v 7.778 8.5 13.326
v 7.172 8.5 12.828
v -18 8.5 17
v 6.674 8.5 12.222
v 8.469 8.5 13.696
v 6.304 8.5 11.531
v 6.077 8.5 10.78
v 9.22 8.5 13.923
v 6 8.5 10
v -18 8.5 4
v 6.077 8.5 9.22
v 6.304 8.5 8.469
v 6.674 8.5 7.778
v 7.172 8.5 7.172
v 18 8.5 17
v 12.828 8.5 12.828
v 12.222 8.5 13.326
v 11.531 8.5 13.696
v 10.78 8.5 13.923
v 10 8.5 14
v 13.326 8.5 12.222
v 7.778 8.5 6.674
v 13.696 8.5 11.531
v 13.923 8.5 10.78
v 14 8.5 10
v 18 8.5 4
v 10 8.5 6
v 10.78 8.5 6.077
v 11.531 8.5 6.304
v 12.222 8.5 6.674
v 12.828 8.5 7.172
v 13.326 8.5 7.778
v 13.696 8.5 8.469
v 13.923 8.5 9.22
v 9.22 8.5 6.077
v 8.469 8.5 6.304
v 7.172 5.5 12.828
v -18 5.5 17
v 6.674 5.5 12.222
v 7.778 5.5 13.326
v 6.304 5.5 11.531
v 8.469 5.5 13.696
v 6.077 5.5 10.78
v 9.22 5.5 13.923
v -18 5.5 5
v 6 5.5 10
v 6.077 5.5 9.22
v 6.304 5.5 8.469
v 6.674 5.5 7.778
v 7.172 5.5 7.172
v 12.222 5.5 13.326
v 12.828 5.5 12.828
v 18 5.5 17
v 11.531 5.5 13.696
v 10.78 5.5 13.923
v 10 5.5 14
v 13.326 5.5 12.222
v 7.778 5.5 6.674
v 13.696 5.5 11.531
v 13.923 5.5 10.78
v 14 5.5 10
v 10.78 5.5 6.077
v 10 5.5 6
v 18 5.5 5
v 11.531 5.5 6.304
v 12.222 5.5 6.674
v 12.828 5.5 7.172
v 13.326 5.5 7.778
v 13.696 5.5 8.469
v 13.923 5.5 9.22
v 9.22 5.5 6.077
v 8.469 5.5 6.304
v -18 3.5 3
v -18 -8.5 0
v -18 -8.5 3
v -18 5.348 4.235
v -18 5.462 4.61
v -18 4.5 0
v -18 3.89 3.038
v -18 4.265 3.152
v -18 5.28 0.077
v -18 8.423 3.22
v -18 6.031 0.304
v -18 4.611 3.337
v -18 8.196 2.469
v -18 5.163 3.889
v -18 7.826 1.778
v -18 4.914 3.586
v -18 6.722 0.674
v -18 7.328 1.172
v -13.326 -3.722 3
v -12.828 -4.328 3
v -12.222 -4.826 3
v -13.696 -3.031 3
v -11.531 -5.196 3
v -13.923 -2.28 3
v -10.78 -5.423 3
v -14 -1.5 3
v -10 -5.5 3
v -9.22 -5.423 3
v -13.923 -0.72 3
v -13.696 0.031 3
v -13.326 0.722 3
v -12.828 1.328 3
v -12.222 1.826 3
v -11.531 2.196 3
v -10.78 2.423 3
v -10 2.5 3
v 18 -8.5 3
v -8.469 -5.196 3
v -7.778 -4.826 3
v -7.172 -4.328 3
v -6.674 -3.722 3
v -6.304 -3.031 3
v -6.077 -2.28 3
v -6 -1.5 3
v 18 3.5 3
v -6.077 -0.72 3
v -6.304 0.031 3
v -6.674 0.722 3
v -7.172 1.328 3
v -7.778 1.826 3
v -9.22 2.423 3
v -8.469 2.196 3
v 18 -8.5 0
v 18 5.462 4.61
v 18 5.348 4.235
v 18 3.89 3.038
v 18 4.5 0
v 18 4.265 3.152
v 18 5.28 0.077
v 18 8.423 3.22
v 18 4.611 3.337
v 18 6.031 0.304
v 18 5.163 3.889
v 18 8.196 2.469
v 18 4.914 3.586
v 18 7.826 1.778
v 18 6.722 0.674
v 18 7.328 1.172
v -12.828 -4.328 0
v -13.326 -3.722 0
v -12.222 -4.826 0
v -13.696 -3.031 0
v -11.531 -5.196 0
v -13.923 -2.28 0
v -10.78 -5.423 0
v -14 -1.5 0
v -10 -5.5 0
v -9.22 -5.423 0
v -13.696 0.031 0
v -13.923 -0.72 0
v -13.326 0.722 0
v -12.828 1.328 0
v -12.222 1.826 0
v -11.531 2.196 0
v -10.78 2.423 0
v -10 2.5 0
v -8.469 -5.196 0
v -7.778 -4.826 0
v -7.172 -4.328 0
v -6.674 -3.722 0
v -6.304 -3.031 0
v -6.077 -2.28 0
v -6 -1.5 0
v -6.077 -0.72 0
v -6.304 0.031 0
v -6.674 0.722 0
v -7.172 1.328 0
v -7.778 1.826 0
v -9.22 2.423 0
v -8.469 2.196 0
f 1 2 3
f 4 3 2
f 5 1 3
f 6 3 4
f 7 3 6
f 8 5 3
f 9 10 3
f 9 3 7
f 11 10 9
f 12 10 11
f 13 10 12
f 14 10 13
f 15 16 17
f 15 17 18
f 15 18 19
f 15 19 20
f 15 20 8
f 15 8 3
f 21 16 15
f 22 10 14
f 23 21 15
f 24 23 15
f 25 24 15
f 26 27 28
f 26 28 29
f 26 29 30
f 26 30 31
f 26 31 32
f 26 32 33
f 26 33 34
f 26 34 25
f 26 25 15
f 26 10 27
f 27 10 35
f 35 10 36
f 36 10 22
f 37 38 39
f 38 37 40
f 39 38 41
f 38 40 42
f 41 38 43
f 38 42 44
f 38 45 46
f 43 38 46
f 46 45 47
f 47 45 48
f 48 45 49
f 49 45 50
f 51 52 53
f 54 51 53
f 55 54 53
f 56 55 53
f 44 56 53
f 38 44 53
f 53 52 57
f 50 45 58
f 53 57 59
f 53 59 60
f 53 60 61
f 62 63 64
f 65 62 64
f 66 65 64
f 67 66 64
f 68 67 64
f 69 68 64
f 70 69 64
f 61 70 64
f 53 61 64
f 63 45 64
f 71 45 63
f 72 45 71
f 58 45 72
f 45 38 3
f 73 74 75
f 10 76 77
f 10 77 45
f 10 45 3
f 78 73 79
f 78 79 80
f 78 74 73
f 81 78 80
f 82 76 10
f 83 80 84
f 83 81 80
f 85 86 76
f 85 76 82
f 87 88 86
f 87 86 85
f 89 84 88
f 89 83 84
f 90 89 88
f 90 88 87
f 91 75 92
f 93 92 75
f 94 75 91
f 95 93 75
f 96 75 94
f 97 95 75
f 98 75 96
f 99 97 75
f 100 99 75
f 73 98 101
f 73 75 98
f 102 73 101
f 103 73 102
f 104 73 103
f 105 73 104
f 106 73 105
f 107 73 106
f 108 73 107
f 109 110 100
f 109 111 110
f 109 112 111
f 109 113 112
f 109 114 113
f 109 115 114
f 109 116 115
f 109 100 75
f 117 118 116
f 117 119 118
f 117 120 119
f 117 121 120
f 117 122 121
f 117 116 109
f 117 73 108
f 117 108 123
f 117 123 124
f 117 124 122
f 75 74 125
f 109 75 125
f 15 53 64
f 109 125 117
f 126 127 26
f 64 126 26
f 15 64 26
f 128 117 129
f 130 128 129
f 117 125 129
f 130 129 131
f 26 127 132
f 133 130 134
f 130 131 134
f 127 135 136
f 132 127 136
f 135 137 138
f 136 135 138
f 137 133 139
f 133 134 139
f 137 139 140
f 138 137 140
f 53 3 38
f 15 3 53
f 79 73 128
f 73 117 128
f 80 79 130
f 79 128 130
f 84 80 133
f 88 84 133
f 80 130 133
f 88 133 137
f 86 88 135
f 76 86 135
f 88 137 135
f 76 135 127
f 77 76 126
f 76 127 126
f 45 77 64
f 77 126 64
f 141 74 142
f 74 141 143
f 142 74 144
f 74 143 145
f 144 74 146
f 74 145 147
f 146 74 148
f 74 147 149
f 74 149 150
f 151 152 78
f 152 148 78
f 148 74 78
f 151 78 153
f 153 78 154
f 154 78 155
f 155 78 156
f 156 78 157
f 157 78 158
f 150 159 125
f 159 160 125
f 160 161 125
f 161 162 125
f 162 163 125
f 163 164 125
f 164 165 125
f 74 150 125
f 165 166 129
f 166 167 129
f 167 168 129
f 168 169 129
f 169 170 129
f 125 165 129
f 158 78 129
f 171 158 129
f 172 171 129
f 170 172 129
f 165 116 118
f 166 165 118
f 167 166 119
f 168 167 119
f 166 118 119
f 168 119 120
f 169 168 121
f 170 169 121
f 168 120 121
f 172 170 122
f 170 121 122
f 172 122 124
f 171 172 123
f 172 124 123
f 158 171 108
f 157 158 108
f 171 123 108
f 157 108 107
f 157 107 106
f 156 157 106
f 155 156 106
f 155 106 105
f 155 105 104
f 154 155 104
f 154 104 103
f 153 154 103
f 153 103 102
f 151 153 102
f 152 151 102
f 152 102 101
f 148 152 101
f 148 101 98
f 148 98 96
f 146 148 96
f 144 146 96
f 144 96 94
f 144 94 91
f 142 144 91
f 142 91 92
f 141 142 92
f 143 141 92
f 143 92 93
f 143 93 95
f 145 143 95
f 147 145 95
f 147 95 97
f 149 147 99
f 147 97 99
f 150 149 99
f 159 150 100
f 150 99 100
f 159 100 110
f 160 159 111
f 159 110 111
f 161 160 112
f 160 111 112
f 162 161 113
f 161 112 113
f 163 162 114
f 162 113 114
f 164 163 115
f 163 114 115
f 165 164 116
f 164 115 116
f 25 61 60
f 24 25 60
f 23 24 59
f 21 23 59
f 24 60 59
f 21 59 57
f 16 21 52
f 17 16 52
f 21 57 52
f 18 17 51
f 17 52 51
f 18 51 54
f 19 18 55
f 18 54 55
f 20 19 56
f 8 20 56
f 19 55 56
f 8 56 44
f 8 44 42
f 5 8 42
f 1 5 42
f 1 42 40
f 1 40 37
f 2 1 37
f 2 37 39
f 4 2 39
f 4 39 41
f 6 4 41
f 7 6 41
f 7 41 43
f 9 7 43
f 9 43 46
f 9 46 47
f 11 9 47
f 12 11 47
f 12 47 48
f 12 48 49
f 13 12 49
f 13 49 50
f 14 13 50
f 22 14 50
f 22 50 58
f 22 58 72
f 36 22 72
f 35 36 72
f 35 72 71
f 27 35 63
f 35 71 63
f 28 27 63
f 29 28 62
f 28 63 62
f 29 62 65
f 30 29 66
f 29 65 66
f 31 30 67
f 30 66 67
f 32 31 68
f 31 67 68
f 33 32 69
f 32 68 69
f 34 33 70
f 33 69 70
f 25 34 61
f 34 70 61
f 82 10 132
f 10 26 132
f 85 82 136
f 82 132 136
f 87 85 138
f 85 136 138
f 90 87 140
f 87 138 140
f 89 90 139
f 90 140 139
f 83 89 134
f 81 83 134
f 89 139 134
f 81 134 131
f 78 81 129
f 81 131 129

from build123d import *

# Parameters (mm, degrees)
SKETCH1_W           = 36
SKETCH1_H           = 17
BOSS_EXTRUDE1_DEPTH = 3
SKETCH15_W          = 36
SKETCH15_H          = 3
BOSS_EXTRUDE2_DEPTH = 14
FILLET2_R           = 2
FILLET3_R           = 4
SKETCH17_R          = 4
CUT_EXTRUDE1_DEPTH  = 18
SKETCH18_R          = 4
CUT_EXTRUDE2_DEPTH  = 18


with BuildPart() as part:
    # Sketch1 → Boss-Extrude1 (new body)
    with BuildSketch(Plane.XY):
        Rectangle(SKETCH1_W, SKETCH1_H)
    extrude(amount=BOSS_EXTRUDE1_DEPTH)

    # Sketch15 → Boss-Extrude2 (add)
    with BuildSketch(Plane.XY.offset(3)):
        with Locations((0, 7)):
            Rectangle(SKETCH15_W, SKETCH15_H)
    extrude(amount=BOSS_EXTRUDE2_DEPTH)

    # Fillet2
    fillet2_edges = [part.edges().sort_by_distance(p)[0] for p in [
        (0, 5.5, 3),
    ]]
    fillet(fillet2_edges, radius=FILLET2_R)

    # Fillet3
    fillet3_edges = [part.edges().sort_by_distance(p)[0] for p in [
        (0, 8.5, 0),
    ]]
    fillet(fillet3_edges, radius=FILLET3_R)

    # Sketch17 → Cut-Extrude1 (cut, through all)
    with BuildSketch(Plane.XZ.offset(8.5)):
        with Locations((10, 10)):
            Circle(SKETCH17_R)
    extrude(amount=-CUT_EXTRUDE1_DEPTH, mode=Mode.SUBTRACT)

    # Sketch18 → Cut-Extrude2 (cut, through all)
    with BuildSketch(Plane.XY.offset(17)):
        with Locations((-10, -1.5)):
            Circle(SKETCH18_R)
    extrude(amount=-CUT_EXTRUDE2_DEPTH, mode=Mode.SUBTRACT)


solid = part.part
